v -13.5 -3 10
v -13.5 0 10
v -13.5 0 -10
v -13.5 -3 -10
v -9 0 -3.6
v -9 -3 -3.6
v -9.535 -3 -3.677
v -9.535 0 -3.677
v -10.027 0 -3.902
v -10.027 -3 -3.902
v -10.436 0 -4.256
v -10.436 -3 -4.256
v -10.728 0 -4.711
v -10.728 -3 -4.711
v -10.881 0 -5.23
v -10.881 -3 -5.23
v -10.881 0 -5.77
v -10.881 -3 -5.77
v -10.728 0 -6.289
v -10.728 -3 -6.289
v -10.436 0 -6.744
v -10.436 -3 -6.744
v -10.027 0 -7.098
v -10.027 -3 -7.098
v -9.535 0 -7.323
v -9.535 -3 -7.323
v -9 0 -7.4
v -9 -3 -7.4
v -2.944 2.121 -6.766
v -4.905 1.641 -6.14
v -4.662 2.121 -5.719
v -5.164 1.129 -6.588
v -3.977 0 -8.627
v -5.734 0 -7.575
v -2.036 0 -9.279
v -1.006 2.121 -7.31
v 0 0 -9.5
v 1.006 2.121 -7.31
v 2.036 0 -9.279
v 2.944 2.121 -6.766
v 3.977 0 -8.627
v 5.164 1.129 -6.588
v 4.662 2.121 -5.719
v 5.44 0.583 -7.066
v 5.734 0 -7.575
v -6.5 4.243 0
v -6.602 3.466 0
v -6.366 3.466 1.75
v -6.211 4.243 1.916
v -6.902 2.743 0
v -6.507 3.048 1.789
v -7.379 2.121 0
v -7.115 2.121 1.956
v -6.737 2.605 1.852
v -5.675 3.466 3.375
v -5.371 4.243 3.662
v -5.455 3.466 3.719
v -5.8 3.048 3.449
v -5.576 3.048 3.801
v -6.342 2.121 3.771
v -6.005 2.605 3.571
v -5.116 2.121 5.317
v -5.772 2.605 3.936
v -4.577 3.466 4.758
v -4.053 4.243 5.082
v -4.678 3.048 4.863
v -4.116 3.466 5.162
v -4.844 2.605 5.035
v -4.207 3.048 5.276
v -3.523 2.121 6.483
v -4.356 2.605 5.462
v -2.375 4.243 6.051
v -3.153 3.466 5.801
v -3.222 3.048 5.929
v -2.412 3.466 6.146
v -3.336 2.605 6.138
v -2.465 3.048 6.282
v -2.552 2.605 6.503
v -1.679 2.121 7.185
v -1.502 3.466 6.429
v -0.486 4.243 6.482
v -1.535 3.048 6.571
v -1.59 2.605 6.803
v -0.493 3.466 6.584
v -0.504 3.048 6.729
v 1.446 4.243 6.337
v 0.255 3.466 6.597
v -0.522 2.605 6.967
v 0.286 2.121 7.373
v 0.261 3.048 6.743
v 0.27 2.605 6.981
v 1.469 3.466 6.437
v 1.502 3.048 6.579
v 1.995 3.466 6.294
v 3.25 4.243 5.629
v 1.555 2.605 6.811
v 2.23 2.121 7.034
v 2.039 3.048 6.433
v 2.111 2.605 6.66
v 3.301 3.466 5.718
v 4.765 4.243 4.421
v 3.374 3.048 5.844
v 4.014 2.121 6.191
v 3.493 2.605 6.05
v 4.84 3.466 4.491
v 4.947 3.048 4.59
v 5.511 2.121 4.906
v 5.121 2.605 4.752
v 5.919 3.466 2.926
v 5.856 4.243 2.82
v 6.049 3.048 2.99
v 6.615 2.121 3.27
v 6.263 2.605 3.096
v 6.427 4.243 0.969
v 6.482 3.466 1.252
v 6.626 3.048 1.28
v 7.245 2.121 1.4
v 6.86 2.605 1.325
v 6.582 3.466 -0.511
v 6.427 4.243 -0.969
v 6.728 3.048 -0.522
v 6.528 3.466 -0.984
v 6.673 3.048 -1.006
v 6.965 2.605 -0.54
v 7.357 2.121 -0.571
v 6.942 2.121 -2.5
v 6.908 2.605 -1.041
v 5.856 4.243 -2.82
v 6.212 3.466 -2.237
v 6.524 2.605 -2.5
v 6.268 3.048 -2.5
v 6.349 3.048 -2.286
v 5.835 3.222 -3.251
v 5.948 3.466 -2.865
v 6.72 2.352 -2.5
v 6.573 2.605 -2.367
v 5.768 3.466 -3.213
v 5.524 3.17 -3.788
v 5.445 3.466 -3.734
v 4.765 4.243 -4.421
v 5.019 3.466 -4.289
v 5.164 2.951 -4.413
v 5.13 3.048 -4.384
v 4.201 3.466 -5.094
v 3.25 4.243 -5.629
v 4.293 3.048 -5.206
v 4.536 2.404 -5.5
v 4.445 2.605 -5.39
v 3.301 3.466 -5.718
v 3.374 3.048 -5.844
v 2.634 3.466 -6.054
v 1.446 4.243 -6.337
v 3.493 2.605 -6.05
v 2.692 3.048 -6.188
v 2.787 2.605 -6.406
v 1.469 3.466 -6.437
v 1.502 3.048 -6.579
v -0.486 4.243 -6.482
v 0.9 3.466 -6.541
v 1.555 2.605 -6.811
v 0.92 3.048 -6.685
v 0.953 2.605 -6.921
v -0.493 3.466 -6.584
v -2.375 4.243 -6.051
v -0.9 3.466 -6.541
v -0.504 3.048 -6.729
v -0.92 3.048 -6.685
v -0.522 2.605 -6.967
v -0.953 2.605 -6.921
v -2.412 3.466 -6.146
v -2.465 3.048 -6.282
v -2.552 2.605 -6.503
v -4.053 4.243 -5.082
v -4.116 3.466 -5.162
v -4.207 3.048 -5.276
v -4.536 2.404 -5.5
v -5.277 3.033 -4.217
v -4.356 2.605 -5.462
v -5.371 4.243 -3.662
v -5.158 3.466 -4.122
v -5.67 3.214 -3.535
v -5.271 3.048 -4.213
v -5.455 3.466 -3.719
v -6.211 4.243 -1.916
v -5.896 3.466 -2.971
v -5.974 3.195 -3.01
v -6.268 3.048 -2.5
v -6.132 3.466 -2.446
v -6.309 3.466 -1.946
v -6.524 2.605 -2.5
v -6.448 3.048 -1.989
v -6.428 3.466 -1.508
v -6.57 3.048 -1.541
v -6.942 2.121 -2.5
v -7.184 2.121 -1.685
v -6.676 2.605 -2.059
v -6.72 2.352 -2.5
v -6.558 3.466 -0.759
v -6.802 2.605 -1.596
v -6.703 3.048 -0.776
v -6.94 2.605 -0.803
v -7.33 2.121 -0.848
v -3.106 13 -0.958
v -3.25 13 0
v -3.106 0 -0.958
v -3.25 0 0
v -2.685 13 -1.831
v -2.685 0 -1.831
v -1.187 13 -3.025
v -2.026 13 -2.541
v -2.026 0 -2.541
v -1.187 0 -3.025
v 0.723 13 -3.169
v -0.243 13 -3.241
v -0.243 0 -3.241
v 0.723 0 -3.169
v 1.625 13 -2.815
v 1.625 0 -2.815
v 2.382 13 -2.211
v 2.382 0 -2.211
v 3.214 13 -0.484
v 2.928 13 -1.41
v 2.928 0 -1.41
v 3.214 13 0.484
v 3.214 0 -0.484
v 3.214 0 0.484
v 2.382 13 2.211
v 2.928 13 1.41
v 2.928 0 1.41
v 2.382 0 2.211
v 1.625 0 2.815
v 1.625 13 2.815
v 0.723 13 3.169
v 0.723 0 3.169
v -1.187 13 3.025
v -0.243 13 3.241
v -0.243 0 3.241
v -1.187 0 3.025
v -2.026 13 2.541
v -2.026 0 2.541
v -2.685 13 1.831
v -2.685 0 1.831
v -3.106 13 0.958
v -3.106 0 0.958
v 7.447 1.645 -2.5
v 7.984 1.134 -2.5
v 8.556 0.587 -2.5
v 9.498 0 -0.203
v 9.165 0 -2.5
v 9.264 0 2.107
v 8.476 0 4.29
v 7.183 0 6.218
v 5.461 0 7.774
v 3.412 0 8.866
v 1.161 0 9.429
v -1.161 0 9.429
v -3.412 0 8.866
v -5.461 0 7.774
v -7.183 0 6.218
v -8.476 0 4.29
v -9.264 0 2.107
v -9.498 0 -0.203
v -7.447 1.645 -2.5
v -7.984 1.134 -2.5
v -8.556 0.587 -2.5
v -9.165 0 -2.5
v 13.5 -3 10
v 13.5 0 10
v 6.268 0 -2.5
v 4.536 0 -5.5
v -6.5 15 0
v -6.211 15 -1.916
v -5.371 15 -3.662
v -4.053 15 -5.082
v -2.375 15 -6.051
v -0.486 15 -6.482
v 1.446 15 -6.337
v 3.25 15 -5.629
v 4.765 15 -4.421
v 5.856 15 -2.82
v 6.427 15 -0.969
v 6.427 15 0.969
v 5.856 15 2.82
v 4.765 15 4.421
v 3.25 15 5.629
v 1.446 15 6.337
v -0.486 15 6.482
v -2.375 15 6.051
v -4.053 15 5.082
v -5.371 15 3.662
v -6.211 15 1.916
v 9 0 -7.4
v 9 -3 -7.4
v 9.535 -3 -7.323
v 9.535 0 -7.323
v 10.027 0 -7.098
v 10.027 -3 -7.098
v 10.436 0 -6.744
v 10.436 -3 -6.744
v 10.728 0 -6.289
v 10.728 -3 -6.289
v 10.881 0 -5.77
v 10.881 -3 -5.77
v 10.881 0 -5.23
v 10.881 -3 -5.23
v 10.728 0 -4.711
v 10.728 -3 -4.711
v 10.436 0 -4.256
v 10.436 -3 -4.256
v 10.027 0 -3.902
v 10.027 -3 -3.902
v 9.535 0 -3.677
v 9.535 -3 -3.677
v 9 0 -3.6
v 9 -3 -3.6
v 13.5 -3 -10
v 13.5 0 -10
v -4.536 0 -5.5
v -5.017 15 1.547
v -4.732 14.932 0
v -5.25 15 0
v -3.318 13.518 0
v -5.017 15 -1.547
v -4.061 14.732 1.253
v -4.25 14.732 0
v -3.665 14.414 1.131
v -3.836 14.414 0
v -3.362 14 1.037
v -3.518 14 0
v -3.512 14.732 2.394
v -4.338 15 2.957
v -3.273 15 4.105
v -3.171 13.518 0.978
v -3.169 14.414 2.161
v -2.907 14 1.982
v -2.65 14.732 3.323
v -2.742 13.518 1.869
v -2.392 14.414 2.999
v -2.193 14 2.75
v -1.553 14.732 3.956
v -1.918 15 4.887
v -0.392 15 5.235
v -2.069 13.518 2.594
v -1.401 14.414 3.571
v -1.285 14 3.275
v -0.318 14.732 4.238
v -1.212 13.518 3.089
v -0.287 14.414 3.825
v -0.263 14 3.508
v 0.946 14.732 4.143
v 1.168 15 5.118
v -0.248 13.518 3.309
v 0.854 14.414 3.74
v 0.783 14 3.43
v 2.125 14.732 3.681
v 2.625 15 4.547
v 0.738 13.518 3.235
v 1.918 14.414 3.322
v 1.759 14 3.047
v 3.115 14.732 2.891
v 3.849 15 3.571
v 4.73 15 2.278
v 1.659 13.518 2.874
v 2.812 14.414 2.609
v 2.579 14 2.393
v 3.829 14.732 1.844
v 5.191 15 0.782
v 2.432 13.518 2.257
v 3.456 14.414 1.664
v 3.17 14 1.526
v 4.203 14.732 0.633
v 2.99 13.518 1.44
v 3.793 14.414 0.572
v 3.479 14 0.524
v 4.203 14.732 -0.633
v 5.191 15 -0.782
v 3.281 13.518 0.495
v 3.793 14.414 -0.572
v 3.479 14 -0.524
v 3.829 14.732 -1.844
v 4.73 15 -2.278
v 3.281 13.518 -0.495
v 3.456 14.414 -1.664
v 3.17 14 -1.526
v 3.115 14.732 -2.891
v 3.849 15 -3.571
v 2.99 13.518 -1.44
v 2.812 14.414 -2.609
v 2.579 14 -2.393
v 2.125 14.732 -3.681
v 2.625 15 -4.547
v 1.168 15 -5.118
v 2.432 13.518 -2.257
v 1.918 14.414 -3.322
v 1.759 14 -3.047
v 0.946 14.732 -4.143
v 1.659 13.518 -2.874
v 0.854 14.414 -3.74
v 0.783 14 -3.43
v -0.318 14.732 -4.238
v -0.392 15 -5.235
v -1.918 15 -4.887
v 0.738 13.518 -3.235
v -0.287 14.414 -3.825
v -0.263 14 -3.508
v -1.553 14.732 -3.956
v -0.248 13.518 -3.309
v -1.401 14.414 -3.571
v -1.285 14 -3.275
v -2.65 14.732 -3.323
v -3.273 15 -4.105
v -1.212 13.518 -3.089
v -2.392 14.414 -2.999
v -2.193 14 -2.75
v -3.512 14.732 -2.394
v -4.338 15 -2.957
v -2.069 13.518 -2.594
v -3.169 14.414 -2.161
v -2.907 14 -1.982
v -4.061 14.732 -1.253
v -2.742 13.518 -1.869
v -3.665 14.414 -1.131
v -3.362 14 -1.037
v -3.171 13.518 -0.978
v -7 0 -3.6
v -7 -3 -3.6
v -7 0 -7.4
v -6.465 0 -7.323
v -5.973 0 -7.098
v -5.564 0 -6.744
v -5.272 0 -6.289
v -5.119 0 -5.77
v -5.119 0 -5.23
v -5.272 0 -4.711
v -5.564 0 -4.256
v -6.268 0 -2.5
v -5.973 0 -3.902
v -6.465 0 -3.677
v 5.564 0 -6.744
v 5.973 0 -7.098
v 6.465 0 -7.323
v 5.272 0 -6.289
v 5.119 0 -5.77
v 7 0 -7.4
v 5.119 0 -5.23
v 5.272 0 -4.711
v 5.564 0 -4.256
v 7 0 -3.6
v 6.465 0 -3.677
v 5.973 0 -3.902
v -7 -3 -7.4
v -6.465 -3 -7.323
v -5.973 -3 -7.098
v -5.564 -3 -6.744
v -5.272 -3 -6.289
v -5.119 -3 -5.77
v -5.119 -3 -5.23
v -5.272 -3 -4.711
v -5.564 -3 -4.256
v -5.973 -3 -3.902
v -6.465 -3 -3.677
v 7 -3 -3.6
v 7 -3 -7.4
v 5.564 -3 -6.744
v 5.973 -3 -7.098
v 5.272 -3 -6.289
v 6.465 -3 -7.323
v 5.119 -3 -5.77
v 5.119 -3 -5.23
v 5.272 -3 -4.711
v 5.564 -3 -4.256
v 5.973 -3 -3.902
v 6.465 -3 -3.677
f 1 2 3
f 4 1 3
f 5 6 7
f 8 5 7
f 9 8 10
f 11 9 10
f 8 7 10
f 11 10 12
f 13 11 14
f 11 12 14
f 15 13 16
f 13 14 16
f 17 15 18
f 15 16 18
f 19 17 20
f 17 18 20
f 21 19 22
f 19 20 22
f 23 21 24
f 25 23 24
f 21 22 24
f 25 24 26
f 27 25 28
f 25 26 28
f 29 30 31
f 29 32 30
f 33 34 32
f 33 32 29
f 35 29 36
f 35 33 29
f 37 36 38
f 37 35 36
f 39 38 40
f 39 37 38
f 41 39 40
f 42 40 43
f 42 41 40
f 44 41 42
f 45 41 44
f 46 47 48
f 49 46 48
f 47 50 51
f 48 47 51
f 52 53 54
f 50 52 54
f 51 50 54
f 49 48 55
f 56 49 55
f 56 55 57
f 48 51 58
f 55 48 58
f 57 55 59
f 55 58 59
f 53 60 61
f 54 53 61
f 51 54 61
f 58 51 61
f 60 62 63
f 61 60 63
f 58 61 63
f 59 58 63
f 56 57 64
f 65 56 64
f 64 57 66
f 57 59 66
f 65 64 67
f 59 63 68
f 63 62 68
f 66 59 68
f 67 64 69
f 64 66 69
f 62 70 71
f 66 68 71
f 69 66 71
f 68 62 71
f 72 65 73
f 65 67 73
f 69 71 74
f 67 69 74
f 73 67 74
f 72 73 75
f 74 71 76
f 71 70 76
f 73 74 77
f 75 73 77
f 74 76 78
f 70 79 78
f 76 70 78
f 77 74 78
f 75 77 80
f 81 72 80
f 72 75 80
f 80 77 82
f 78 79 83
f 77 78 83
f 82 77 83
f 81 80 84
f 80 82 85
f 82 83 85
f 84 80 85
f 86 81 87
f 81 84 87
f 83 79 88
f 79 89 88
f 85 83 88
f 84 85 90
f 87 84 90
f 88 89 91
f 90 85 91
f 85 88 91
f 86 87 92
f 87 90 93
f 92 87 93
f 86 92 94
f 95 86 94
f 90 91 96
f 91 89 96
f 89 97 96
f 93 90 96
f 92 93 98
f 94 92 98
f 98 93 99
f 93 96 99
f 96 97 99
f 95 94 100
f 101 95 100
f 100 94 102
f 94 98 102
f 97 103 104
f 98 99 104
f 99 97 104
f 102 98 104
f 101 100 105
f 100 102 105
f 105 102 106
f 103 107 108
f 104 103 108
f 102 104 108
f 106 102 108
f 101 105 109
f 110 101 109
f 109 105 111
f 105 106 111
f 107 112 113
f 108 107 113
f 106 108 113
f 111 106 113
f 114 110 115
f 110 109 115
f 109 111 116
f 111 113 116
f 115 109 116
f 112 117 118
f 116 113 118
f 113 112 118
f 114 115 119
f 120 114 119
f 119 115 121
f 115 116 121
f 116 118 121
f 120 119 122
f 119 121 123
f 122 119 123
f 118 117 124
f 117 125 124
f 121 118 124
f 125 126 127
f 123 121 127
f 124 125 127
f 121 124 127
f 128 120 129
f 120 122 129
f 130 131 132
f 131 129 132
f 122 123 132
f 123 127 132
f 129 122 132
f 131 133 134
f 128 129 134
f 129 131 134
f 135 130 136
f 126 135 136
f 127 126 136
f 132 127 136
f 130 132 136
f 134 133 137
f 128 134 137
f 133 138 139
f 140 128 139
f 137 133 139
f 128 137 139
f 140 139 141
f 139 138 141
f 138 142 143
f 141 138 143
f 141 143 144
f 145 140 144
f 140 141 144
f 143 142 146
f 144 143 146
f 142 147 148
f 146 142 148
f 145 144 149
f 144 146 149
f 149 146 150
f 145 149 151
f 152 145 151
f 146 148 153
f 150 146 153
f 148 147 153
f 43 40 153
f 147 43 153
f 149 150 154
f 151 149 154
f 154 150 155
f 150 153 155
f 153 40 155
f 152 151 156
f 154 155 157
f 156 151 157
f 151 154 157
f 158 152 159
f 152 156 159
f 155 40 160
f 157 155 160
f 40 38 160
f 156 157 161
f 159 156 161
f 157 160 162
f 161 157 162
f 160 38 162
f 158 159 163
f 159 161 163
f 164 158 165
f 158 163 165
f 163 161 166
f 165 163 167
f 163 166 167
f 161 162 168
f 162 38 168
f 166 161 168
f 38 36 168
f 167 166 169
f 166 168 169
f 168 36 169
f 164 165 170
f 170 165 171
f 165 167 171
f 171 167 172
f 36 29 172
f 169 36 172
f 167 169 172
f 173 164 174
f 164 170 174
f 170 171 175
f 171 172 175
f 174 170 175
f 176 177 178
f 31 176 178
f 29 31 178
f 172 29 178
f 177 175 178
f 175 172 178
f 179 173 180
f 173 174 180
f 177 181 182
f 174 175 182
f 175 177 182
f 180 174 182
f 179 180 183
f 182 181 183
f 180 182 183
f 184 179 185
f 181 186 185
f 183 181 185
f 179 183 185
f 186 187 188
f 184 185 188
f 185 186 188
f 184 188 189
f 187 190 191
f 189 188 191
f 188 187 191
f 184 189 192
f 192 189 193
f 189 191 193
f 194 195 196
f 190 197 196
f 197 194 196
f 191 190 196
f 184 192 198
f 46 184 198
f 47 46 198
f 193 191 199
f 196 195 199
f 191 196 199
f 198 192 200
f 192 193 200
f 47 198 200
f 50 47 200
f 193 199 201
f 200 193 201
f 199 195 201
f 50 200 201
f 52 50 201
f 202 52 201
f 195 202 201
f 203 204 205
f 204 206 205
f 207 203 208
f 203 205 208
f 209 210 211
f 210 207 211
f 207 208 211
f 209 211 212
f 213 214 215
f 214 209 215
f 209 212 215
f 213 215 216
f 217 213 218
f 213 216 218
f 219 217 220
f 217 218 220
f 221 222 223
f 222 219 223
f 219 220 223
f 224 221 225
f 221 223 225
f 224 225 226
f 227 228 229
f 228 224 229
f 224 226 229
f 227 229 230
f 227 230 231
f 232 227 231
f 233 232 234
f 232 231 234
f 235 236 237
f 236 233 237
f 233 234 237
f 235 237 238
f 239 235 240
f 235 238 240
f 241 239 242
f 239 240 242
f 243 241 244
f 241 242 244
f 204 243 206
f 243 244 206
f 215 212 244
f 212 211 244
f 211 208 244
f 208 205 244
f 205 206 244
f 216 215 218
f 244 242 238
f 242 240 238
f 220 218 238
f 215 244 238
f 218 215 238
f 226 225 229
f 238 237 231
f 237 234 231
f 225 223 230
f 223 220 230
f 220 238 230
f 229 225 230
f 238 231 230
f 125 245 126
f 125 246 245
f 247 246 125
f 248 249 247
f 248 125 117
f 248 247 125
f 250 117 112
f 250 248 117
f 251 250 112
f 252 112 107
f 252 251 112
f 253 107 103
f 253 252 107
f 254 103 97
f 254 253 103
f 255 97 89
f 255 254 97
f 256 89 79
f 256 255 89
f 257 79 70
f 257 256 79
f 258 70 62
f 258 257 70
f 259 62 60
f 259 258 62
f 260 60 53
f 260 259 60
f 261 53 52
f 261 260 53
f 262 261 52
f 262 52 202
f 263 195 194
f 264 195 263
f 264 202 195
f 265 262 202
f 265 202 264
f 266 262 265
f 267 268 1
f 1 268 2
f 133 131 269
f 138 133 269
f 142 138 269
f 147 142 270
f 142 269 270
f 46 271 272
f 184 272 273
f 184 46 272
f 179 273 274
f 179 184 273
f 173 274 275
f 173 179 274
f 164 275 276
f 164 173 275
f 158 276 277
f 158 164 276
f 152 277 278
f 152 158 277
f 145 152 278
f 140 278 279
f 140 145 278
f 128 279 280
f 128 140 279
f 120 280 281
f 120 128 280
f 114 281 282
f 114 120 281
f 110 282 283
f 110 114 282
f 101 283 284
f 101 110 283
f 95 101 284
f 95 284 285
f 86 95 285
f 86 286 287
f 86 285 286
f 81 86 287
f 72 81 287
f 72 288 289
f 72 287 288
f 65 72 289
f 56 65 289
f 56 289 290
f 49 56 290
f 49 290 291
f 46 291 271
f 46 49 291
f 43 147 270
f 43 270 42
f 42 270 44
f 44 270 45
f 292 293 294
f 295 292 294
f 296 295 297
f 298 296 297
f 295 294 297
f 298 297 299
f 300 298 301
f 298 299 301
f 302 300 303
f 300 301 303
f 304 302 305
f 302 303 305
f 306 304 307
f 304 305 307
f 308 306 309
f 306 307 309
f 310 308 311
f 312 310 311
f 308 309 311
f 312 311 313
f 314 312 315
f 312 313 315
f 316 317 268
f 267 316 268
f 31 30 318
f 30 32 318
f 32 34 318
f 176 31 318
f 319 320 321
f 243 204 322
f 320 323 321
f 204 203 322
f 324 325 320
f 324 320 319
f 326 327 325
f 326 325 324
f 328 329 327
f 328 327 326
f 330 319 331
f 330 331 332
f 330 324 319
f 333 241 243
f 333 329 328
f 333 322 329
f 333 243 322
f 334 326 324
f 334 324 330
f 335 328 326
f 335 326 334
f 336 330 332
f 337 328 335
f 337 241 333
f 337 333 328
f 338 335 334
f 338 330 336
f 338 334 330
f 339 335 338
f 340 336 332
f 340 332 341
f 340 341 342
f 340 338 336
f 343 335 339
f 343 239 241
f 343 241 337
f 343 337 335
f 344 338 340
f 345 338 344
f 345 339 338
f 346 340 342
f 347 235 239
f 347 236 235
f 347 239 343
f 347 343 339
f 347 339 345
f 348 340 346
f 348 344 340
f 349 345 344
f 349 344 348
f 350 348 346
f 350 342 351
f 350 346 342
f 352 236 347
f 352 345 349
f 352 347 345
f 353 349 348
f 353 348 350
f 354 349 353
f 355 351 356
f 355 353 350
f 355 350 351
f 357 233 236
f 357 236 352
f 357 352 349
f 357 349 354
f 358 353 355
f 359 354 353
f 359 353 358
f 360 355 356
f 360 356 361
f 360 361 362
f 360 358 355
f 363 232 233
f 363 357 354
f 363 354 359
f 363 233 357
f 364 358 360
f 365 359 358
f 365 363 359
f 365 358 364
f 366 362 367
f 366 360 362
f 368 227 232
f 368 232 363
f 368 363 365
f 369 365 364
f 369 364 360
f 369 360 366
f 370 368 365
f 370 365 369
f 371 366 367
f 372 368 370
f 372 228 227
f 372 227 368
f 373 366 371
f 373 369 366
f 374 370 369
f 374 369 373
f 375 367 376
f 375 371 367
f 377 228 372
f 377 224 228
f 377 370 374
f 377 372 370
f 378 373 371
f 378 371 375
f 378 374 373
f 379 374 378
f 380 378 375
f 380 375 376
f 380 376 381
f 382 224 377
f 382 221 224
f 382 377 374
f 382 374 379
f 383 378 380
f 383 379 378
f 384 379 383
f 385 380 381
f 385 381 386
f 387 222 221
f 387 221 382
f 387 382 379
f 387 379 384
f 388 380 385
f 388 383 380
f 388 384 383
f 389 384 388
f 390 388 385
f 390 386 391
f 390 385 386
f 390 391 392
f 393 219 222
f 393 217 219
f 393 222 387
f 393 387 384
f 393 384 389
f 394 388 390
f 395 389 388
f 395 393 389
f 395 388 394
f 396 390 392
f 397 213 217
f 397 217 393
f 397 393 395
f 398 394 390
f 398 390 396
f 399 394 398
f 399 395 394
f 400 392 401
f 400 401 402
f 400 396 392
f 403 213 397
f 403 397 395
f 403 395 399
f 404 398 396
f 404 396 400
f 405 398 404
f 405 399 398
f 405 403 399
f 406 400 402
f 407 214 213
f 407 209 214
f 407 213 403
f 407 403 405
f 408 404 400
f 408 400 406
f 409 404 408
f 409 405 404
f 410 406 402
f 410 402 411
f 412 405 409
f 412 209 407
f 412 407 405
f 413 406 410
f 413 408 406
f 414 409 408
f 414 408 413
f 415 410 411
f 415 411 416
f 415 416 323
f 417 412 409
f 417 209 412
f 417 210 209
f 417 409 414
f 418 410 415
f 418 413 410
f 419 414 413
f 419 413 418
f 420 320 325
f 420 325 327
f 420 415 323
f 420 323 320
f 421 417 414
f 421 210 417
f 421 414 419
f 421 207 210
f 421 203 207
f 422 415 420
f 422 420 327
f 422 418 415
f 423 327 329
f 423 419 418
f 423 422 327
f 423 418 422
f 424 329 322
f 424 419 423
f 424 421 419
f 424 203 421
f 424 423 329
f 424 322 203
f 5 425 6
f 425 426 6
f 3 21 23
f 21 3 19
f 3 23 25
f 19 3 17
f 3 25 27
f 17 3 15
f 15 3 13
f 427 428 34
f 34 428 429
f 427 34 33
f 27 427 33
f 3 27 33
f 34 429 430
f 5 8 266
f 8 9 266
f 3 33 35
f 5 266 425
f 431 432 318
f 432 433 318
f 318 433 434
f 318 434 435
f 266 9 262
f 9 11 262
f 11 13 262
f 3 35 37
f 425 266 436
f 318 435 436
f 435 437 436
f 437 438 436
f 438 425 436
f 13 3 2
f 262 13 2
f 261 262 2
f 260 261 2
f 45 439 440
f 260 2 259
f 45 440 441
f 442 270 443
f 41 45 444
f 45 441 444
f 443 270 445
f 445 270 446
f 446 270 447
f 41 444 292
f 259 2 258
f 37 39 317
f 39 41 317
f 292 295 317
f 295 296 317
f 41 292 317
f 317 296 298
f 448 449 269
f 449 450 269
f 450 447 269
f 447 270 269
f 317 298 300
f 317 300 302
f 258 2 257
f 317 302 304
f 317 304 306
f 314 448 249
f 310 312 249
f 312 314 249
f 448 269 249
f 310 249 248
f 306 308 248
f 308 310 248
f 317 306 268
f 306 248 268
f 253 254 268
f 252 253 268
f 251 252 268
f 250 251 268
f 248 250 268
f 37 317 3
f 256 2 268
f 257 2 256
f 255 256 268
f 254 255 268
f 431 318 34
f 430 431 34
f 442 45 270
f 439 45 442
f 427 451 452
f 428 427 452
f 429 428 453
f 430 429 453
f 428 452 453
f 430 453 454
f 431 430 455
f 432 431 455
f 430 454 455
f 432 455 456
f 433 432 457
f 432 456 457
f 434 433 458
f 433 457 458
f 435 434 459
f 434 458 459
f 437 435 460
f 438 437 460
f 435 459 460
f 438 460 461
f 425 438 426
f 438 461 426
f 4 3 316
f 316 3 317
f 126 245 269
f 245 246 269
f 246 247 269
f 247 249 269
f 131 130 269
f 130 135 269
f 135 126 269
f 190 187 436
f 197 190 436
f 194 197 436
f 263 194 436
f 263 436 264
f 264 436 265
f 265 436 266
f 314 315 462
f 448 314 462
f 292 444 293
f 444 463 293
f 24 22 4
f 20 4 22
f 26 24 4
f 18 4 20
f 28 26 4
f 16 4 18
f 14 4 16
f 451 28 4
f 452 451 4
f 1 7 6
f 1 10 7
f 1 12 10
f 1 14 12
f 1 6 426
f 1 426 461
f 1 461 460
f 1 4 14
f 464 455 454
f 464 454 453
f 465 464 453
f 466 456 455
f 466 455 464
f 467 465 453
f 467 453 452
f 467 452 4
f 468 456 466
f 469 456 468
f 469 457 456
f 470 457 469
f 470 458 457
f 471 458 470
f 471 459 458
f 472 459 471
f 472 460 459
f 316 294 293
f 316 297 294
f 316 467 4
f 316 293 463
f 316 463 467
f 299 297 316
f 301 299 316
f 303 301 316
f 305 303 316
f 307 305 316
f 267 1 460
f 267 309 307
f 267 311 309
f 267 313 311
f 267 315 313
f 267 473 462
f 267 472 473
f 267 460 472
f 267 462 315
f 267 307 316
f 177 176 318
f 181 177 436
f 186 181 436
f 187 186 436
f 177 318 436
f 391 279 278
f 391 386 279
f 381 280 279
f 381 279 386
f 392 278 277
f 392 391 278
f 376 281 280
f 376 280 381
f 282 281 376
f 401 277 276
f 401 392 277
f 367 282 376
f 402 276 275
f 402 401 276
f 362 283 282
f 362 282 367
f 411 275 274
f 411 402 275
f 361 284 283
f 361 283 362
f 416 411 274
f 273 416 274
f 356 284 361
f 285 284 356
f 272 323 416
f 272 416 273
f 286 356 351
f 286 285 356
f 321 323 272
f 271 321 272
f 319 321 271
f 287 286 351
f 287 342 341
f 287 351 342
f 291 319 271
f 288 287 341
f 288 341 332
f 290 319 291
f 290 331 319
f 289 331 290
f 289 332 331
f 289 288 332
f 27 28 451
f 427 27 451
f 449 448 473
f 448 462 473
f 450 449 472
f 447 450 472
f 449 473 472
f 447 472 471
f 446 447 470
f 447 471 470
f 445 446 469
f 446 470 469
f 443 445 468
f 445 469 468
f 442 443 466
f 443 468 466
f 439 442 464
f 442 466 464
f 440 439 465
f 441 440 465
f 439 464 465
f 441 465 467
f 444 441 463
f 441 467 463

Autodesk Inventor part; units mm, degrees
ref_plane "YZ Plane" through (0, 0, 0) normal (1, 0, 0) x (0, 1, 0)
ref_plane "XZ Plane" through (0, 0, 0) normal (0, 1, 0) x (-1, 0, 0)
ref_plane "XY Plane" through (0, 0, 0) normal (0, 0, 1) x (1, 0, 0)
sketch "Schizzo1" plane through (0, 0, 0) normal (0, 1, 0) x (-1, 0, 0)
  circle A0 centre (0, 0) radius 3.25
  circle A1 centre (0, 0) radius 6.5
  dimension "d0" = 6.5
  dimension "d1" = 13
extrude "Estrusione1" add sketch "Schizzo1" along normal blind 15
sketch "Schizzo2" plane through (0, 0, 0) normal (0, -1, 0) x (1, 0, 0)
  line L0 (-13.5, -10) -> (13.5, -10)
  line L1 (13.5, -10) -> (13.5, 10)
  line L2 (13.5, 10) -> (-13.5, 10)
  line L3 (-13.5, 10) -> (-13.5, -10)
  line L4 (-13.5, -10) -> (13.5, 10) construction
  line L5 (13.5, -10) -> (-13.5, 10) construction
  point P0 (0, 0)
  point P1 (0, 0)
  point P2 (0, 0)
  dimension "d4" = 20
  dimension "d5" = 27
extrude "Estrusione2" add sketch "Schizzo2" along normal blind 3
sketch "Schizzo3" plane through (0, -3, 0) normal (0, -1, 0) x (1, 0, 0)
  line L0 (0, 0) -> (-8, 0)
  line L1 (0, 0) -> (8, 0) construction
  line L2 (-8, 0) -> (-8, -5.5)
  line L3 (0, 0) -> (8, 0)
  line L4 (0, 0) -> (8, 0) construction
  line L5 (8, 0) -> (8, -5.5)
  circle A0 centre (0, 0) radius 6.5 projected
  circle A1 centre (0, 0) radius 9.5 projected
  line L6 (-20.3813, -5.5) -> (-15.9716, -5.5)
  line L7 (-20.3813, -5.5) -> (-15.9716, -5.5) construction
  line L8 (-9, -5.5) -> (-7, -5.5)
  line L9 (-9, -5.5) -> (-7, -5.5) construction
  line L10 (-9, -5.5) -> (-7, -5.5) construction
  line L11 (-9, -7.4) -> (-7, -7.4)
  line L12 (-7, -3.6) -> (-9, -3.6)
  arc A2 (-9, -3.6) -> (-9, -7.4) centre (-9, -5.5) ccw
  arc A3 (-7, -7.4) -> (-7, -3.6) centre (-7, -5.5) ccw
  line L13 (7, -5.5) -> (9, -5.5)
  line L14 (7, -5.5) -> (9, -5.5) construction
  line L15 (7, -5.5) -> (9, -5.5) construction
  line L16 (7, -7.4) -> (9, -7.4)
  line L17 (9, -3.6) -> (7, -3.6)
  arc A4 (7, -3.6) -> (7, -7.4) centre (7, -5.5) ccw
  arc A5 (9, -7.4) -> (9, -3.6) centre (9, -5.5) ccw
  point P0 (2.8723, -8)
  point P1 (13.5, -10)
  point P2 (-13.5, -10)
  point P3 (8, -5.5)
  point P4 (0, -10)
  point P5 (0, 10)
  dimension "d21" = 8
  dimension "d22" = 180
  dimension "d23" = 5.5
  dimension "d24" = 90
  dimension "d25" = 8
  dimension "d26" = 0
  dimension "d27" = 5.5
  dimension "d28" = 90
  dimension "d31" = 0
  dimension "d32" = 0
  dimension "d33" = 2
  dimension "d34" = 3.8
  dimension "d35" = 0
  dimension "d36" = 3.8
  dimension "d37" = 2
extrude "Estrusione3" cut sketch "Schizzo3" against normal blind 10 contours L12 A3 A1 L2 | L2 A1 L12 | L17 A1 L5 | L5 A1 A4 L17 | A1 L8 L2 | L2 L8 A1 A3 L11 A2 L12 | A1 L17 A5 L16 A4 L13 L5 | L5 L13 A1
fillet "Raccordo2" radius 2 1 edges at (3.25, 15, 0)
chamfer "Smusso2" distance 3 angle 45 1 edges at (6.5, 0, 0)
fillet "Raccordo3" radius 3 1 edges at (6.5, 3, 0)
sketch "Schizzo4" plane through (0, 0, 0) normal (0, 1, 0) x (1, 0, 0)
  arc A0 (9, 3.6) -> (9, 7.4) centre (9, 5.5) ccw projected
  arc A1 (7, 7.4) -> (7, 3.6) centre (7, 5.5) ccw projected
  line L0 (9, 5.5) -> (7, 5.5)
  arc A2 (-9, 7.4) -> (-9, 3.6) centre (-9, 5.5) ccw projected
  arc A3 (-7, 3.6) -> (-7, 7.4) centre (-7, 5.5) ccw projected
  line L1 (-9, 5.5) -> (-7, 5.5)
  circle A4 centre (8, 5.5) radius 3
  circle A5 centre (-8, 5.5) radius 3
  line L2 (6.2679, 2.5) -> (4.5359, 5.5)
  line L3 (4.5359, 5.5) -> (6.2679, 8.5)
  line L4 (6.2679, 8.5) -> (9.7321, 8.5)
  line L5 (9.7321, 8.5) -> (11.4641, 5.5)
  line L6 (11.4641, 5.5) -> (9.7321, 2.5)
  line L7 (9.7321, 2.5) -> (6.2679, 2.5)
  line L8 (-6.2679, 8.5) -> (-4.5359, 5.5)
  line L9 (-4.5359, 5.5) -> (-6.2679, 2.5)
  line L10 (-6.2679, 2.5) -> (-9.7321, 2.5)
  line L11 (-9.7321, 2.5) -> (-11.4641, 5.5)
  line L12 (-11.4641, 5.5) -> (-9.7321, 8.5)
  line L13 (-9.7321, 8.5) -> (-6.2679, 8.5)
  point P0 (0, 0)
  point P1 (9.3191, 3.627)
  point P2 (-9.3191, 3.627)
  point P3 (8, 2.5)
  point P4 (-8, 8.5)
  dimension "d45" = 6
  dimension "d46" = 6
extrude "Estrusione6" cut sketch "Schizzo4" along normal blind 6
properties part number "11_Connettore_MPU"
